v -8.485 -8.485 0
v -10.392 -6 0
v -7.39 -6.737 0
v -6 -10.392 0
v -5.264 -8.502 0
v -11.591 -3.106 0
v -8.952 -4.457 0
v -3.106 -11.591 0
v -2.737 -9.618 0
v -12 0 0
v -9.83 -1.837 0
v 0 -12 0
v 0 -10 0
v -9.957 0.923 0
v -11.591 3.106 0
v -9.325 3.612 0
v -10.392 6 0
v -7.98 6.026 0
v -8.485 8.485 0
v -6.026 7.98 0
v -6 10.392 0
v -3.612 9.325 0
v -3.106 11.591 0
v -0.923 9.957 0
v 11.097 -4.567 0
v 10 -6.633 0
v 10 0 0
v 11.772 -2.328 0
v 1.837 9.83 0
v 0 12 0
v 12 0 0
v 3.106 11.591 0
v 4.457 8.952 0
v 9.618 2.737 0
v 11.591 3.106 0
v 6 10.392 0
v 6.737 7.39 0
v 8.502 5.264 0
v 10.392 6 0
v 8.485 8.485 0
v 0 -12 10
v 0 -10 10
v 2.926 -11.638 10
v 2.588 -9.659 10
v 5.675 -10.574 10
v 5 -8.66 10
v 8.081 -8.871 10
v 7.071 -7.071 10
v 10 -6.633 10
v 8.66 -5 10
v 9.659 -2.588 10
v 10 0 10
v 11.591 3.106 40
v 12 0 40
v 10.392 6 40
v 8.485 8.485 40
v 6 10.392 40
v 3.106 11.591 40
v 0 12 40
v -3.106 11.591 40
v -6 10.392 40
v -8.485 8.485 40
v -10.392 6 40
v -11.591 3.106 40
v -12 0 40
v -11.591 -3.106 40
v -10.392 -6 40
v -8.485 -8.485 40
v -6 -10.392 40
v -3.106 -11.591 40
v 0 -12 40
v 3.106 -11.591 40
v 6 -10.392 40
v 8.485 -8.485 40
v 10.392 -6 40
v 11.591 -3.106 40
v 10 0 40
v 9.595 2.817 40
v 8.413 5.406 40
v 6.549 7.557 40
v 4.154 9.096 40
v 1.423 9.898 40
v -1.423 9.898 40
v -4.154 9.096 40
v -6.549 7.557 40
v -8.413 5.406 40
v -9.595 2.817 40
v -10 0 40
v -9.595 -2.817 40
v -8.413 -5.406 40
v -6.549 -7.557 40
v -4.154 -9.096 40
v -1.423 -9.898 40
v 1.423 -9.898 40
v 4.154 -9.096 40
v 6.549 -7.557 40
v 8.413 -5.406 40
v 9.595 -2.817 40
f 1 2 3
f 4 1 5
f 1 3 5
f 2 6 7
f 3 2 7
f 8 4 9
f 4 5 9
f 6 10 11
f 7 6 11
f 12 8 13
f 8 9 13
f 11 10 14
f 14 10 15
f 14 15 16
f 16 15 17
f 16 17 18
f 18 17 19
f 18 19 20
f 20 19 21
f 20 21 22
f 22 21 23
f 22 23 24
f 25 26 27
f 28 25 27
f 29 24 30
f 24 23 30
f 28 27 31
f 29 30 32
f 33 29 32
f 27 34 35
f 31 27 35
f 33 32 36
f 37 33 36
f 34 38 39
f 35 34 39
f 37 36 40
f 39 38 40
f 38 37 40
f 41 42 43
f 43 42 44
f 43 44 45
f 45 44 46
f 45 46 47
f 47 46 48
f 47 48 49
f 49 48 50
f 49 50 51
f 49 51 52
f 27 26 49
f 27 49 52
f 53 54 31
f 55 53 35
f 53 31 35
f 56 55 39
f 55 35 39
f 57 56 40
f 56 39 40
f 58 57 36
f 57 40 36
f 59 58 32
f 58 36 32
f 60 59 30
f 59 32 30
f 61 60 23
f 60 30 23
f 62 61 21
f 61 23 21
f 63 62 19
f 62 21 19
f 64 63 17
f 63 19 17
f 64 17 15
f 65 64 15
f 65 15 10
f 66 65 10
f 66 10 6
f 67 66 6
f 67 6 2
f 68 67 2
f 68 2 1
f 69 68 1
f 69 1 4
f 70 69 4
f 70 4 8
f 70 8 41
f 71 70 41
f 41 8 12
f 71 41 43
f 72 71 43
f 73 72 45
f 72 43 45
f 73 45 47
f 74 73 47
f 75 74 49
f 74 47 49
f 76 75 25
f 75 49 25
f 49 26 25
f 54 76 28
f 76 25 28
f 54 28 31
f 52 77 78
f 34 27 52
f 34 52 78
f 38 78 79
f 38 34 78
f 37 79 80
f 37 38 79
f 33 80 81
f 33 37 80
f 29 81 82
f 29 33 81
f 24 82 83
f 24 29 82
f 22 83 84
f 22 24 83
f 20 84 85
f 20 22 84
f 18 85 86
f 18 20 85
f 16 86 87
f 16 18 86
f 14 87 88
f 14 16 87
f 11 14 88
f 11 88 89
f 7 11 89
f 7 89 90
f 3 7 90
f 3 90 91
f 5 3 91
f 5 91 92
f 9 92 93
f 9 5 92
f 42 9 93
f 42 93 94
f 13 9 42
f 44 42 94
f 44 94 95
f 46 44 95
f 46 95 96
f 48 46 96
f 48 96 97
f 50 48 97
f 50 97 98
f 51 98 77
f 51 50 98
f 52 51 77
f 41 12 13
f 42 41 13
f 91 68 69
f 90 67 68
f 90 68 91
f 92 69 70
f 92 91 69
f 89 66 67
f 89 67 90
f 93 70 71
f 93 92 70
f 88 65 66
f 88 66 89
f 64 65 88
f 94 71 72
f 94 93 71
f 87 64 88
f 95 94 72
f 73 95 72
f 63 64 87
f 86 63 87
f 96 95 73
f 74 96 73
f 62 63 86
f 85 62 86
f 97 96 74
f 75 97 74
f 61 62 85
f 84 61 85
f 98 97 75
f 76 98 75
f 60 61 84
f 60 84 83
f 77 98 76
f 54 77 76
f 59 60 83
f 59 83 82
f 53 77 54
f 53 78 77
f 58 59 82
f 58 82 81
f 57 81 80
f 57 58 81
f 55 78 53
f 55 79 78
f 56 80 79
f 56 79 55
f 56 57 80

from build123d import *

# Parameters (mm, degrees)
BOX001_W          = 10
BOX001_H          = 20
BOX001_DEPTH      = 10
CYLINDER001_R     = 10
CYLINDER001_DEPTH = 40
CYLINDER002_R     = 12
CYLINDER002_DEPTH = 40


with BuildPart() as cubo:
    # Box001 → Box001 (new body)
    with BuildSketch(Plane(origin=(0, -20, 0), x_dir=(1, 0, 0), z_dir=(0, 0, 1))):
        with Locations((5, 10)):
            Rectangle(BOX001_W, BOX001_H)
    extrude(amount=BOX001_DEPTH)


with BuildPart() as cilindro:
    # Cylinder001 → Cylinder001 (new body)
    with BuildSketch(Plane.XY):
        Circle(CYLINDER001_R)
    extrude(amount=CYLINDER001_DEPTH)


with BuildPart() as exterior_torre:
    # Cylinder002 → Cylinder002 (new body)
    with BuildSketch(Plane.XY):
        Circle(CYLINDER002_R)
    extrude(amount=CYLINDER002_DEPTH)

    # Cut: cut Cilindro
    add(cilindro.part, mode=Mode.SUBTRACT)

    # Cut001: cut Cubo
    add(cubo.part, mode=Mode.SUBTRACT)


solid = exterior_torre.part
